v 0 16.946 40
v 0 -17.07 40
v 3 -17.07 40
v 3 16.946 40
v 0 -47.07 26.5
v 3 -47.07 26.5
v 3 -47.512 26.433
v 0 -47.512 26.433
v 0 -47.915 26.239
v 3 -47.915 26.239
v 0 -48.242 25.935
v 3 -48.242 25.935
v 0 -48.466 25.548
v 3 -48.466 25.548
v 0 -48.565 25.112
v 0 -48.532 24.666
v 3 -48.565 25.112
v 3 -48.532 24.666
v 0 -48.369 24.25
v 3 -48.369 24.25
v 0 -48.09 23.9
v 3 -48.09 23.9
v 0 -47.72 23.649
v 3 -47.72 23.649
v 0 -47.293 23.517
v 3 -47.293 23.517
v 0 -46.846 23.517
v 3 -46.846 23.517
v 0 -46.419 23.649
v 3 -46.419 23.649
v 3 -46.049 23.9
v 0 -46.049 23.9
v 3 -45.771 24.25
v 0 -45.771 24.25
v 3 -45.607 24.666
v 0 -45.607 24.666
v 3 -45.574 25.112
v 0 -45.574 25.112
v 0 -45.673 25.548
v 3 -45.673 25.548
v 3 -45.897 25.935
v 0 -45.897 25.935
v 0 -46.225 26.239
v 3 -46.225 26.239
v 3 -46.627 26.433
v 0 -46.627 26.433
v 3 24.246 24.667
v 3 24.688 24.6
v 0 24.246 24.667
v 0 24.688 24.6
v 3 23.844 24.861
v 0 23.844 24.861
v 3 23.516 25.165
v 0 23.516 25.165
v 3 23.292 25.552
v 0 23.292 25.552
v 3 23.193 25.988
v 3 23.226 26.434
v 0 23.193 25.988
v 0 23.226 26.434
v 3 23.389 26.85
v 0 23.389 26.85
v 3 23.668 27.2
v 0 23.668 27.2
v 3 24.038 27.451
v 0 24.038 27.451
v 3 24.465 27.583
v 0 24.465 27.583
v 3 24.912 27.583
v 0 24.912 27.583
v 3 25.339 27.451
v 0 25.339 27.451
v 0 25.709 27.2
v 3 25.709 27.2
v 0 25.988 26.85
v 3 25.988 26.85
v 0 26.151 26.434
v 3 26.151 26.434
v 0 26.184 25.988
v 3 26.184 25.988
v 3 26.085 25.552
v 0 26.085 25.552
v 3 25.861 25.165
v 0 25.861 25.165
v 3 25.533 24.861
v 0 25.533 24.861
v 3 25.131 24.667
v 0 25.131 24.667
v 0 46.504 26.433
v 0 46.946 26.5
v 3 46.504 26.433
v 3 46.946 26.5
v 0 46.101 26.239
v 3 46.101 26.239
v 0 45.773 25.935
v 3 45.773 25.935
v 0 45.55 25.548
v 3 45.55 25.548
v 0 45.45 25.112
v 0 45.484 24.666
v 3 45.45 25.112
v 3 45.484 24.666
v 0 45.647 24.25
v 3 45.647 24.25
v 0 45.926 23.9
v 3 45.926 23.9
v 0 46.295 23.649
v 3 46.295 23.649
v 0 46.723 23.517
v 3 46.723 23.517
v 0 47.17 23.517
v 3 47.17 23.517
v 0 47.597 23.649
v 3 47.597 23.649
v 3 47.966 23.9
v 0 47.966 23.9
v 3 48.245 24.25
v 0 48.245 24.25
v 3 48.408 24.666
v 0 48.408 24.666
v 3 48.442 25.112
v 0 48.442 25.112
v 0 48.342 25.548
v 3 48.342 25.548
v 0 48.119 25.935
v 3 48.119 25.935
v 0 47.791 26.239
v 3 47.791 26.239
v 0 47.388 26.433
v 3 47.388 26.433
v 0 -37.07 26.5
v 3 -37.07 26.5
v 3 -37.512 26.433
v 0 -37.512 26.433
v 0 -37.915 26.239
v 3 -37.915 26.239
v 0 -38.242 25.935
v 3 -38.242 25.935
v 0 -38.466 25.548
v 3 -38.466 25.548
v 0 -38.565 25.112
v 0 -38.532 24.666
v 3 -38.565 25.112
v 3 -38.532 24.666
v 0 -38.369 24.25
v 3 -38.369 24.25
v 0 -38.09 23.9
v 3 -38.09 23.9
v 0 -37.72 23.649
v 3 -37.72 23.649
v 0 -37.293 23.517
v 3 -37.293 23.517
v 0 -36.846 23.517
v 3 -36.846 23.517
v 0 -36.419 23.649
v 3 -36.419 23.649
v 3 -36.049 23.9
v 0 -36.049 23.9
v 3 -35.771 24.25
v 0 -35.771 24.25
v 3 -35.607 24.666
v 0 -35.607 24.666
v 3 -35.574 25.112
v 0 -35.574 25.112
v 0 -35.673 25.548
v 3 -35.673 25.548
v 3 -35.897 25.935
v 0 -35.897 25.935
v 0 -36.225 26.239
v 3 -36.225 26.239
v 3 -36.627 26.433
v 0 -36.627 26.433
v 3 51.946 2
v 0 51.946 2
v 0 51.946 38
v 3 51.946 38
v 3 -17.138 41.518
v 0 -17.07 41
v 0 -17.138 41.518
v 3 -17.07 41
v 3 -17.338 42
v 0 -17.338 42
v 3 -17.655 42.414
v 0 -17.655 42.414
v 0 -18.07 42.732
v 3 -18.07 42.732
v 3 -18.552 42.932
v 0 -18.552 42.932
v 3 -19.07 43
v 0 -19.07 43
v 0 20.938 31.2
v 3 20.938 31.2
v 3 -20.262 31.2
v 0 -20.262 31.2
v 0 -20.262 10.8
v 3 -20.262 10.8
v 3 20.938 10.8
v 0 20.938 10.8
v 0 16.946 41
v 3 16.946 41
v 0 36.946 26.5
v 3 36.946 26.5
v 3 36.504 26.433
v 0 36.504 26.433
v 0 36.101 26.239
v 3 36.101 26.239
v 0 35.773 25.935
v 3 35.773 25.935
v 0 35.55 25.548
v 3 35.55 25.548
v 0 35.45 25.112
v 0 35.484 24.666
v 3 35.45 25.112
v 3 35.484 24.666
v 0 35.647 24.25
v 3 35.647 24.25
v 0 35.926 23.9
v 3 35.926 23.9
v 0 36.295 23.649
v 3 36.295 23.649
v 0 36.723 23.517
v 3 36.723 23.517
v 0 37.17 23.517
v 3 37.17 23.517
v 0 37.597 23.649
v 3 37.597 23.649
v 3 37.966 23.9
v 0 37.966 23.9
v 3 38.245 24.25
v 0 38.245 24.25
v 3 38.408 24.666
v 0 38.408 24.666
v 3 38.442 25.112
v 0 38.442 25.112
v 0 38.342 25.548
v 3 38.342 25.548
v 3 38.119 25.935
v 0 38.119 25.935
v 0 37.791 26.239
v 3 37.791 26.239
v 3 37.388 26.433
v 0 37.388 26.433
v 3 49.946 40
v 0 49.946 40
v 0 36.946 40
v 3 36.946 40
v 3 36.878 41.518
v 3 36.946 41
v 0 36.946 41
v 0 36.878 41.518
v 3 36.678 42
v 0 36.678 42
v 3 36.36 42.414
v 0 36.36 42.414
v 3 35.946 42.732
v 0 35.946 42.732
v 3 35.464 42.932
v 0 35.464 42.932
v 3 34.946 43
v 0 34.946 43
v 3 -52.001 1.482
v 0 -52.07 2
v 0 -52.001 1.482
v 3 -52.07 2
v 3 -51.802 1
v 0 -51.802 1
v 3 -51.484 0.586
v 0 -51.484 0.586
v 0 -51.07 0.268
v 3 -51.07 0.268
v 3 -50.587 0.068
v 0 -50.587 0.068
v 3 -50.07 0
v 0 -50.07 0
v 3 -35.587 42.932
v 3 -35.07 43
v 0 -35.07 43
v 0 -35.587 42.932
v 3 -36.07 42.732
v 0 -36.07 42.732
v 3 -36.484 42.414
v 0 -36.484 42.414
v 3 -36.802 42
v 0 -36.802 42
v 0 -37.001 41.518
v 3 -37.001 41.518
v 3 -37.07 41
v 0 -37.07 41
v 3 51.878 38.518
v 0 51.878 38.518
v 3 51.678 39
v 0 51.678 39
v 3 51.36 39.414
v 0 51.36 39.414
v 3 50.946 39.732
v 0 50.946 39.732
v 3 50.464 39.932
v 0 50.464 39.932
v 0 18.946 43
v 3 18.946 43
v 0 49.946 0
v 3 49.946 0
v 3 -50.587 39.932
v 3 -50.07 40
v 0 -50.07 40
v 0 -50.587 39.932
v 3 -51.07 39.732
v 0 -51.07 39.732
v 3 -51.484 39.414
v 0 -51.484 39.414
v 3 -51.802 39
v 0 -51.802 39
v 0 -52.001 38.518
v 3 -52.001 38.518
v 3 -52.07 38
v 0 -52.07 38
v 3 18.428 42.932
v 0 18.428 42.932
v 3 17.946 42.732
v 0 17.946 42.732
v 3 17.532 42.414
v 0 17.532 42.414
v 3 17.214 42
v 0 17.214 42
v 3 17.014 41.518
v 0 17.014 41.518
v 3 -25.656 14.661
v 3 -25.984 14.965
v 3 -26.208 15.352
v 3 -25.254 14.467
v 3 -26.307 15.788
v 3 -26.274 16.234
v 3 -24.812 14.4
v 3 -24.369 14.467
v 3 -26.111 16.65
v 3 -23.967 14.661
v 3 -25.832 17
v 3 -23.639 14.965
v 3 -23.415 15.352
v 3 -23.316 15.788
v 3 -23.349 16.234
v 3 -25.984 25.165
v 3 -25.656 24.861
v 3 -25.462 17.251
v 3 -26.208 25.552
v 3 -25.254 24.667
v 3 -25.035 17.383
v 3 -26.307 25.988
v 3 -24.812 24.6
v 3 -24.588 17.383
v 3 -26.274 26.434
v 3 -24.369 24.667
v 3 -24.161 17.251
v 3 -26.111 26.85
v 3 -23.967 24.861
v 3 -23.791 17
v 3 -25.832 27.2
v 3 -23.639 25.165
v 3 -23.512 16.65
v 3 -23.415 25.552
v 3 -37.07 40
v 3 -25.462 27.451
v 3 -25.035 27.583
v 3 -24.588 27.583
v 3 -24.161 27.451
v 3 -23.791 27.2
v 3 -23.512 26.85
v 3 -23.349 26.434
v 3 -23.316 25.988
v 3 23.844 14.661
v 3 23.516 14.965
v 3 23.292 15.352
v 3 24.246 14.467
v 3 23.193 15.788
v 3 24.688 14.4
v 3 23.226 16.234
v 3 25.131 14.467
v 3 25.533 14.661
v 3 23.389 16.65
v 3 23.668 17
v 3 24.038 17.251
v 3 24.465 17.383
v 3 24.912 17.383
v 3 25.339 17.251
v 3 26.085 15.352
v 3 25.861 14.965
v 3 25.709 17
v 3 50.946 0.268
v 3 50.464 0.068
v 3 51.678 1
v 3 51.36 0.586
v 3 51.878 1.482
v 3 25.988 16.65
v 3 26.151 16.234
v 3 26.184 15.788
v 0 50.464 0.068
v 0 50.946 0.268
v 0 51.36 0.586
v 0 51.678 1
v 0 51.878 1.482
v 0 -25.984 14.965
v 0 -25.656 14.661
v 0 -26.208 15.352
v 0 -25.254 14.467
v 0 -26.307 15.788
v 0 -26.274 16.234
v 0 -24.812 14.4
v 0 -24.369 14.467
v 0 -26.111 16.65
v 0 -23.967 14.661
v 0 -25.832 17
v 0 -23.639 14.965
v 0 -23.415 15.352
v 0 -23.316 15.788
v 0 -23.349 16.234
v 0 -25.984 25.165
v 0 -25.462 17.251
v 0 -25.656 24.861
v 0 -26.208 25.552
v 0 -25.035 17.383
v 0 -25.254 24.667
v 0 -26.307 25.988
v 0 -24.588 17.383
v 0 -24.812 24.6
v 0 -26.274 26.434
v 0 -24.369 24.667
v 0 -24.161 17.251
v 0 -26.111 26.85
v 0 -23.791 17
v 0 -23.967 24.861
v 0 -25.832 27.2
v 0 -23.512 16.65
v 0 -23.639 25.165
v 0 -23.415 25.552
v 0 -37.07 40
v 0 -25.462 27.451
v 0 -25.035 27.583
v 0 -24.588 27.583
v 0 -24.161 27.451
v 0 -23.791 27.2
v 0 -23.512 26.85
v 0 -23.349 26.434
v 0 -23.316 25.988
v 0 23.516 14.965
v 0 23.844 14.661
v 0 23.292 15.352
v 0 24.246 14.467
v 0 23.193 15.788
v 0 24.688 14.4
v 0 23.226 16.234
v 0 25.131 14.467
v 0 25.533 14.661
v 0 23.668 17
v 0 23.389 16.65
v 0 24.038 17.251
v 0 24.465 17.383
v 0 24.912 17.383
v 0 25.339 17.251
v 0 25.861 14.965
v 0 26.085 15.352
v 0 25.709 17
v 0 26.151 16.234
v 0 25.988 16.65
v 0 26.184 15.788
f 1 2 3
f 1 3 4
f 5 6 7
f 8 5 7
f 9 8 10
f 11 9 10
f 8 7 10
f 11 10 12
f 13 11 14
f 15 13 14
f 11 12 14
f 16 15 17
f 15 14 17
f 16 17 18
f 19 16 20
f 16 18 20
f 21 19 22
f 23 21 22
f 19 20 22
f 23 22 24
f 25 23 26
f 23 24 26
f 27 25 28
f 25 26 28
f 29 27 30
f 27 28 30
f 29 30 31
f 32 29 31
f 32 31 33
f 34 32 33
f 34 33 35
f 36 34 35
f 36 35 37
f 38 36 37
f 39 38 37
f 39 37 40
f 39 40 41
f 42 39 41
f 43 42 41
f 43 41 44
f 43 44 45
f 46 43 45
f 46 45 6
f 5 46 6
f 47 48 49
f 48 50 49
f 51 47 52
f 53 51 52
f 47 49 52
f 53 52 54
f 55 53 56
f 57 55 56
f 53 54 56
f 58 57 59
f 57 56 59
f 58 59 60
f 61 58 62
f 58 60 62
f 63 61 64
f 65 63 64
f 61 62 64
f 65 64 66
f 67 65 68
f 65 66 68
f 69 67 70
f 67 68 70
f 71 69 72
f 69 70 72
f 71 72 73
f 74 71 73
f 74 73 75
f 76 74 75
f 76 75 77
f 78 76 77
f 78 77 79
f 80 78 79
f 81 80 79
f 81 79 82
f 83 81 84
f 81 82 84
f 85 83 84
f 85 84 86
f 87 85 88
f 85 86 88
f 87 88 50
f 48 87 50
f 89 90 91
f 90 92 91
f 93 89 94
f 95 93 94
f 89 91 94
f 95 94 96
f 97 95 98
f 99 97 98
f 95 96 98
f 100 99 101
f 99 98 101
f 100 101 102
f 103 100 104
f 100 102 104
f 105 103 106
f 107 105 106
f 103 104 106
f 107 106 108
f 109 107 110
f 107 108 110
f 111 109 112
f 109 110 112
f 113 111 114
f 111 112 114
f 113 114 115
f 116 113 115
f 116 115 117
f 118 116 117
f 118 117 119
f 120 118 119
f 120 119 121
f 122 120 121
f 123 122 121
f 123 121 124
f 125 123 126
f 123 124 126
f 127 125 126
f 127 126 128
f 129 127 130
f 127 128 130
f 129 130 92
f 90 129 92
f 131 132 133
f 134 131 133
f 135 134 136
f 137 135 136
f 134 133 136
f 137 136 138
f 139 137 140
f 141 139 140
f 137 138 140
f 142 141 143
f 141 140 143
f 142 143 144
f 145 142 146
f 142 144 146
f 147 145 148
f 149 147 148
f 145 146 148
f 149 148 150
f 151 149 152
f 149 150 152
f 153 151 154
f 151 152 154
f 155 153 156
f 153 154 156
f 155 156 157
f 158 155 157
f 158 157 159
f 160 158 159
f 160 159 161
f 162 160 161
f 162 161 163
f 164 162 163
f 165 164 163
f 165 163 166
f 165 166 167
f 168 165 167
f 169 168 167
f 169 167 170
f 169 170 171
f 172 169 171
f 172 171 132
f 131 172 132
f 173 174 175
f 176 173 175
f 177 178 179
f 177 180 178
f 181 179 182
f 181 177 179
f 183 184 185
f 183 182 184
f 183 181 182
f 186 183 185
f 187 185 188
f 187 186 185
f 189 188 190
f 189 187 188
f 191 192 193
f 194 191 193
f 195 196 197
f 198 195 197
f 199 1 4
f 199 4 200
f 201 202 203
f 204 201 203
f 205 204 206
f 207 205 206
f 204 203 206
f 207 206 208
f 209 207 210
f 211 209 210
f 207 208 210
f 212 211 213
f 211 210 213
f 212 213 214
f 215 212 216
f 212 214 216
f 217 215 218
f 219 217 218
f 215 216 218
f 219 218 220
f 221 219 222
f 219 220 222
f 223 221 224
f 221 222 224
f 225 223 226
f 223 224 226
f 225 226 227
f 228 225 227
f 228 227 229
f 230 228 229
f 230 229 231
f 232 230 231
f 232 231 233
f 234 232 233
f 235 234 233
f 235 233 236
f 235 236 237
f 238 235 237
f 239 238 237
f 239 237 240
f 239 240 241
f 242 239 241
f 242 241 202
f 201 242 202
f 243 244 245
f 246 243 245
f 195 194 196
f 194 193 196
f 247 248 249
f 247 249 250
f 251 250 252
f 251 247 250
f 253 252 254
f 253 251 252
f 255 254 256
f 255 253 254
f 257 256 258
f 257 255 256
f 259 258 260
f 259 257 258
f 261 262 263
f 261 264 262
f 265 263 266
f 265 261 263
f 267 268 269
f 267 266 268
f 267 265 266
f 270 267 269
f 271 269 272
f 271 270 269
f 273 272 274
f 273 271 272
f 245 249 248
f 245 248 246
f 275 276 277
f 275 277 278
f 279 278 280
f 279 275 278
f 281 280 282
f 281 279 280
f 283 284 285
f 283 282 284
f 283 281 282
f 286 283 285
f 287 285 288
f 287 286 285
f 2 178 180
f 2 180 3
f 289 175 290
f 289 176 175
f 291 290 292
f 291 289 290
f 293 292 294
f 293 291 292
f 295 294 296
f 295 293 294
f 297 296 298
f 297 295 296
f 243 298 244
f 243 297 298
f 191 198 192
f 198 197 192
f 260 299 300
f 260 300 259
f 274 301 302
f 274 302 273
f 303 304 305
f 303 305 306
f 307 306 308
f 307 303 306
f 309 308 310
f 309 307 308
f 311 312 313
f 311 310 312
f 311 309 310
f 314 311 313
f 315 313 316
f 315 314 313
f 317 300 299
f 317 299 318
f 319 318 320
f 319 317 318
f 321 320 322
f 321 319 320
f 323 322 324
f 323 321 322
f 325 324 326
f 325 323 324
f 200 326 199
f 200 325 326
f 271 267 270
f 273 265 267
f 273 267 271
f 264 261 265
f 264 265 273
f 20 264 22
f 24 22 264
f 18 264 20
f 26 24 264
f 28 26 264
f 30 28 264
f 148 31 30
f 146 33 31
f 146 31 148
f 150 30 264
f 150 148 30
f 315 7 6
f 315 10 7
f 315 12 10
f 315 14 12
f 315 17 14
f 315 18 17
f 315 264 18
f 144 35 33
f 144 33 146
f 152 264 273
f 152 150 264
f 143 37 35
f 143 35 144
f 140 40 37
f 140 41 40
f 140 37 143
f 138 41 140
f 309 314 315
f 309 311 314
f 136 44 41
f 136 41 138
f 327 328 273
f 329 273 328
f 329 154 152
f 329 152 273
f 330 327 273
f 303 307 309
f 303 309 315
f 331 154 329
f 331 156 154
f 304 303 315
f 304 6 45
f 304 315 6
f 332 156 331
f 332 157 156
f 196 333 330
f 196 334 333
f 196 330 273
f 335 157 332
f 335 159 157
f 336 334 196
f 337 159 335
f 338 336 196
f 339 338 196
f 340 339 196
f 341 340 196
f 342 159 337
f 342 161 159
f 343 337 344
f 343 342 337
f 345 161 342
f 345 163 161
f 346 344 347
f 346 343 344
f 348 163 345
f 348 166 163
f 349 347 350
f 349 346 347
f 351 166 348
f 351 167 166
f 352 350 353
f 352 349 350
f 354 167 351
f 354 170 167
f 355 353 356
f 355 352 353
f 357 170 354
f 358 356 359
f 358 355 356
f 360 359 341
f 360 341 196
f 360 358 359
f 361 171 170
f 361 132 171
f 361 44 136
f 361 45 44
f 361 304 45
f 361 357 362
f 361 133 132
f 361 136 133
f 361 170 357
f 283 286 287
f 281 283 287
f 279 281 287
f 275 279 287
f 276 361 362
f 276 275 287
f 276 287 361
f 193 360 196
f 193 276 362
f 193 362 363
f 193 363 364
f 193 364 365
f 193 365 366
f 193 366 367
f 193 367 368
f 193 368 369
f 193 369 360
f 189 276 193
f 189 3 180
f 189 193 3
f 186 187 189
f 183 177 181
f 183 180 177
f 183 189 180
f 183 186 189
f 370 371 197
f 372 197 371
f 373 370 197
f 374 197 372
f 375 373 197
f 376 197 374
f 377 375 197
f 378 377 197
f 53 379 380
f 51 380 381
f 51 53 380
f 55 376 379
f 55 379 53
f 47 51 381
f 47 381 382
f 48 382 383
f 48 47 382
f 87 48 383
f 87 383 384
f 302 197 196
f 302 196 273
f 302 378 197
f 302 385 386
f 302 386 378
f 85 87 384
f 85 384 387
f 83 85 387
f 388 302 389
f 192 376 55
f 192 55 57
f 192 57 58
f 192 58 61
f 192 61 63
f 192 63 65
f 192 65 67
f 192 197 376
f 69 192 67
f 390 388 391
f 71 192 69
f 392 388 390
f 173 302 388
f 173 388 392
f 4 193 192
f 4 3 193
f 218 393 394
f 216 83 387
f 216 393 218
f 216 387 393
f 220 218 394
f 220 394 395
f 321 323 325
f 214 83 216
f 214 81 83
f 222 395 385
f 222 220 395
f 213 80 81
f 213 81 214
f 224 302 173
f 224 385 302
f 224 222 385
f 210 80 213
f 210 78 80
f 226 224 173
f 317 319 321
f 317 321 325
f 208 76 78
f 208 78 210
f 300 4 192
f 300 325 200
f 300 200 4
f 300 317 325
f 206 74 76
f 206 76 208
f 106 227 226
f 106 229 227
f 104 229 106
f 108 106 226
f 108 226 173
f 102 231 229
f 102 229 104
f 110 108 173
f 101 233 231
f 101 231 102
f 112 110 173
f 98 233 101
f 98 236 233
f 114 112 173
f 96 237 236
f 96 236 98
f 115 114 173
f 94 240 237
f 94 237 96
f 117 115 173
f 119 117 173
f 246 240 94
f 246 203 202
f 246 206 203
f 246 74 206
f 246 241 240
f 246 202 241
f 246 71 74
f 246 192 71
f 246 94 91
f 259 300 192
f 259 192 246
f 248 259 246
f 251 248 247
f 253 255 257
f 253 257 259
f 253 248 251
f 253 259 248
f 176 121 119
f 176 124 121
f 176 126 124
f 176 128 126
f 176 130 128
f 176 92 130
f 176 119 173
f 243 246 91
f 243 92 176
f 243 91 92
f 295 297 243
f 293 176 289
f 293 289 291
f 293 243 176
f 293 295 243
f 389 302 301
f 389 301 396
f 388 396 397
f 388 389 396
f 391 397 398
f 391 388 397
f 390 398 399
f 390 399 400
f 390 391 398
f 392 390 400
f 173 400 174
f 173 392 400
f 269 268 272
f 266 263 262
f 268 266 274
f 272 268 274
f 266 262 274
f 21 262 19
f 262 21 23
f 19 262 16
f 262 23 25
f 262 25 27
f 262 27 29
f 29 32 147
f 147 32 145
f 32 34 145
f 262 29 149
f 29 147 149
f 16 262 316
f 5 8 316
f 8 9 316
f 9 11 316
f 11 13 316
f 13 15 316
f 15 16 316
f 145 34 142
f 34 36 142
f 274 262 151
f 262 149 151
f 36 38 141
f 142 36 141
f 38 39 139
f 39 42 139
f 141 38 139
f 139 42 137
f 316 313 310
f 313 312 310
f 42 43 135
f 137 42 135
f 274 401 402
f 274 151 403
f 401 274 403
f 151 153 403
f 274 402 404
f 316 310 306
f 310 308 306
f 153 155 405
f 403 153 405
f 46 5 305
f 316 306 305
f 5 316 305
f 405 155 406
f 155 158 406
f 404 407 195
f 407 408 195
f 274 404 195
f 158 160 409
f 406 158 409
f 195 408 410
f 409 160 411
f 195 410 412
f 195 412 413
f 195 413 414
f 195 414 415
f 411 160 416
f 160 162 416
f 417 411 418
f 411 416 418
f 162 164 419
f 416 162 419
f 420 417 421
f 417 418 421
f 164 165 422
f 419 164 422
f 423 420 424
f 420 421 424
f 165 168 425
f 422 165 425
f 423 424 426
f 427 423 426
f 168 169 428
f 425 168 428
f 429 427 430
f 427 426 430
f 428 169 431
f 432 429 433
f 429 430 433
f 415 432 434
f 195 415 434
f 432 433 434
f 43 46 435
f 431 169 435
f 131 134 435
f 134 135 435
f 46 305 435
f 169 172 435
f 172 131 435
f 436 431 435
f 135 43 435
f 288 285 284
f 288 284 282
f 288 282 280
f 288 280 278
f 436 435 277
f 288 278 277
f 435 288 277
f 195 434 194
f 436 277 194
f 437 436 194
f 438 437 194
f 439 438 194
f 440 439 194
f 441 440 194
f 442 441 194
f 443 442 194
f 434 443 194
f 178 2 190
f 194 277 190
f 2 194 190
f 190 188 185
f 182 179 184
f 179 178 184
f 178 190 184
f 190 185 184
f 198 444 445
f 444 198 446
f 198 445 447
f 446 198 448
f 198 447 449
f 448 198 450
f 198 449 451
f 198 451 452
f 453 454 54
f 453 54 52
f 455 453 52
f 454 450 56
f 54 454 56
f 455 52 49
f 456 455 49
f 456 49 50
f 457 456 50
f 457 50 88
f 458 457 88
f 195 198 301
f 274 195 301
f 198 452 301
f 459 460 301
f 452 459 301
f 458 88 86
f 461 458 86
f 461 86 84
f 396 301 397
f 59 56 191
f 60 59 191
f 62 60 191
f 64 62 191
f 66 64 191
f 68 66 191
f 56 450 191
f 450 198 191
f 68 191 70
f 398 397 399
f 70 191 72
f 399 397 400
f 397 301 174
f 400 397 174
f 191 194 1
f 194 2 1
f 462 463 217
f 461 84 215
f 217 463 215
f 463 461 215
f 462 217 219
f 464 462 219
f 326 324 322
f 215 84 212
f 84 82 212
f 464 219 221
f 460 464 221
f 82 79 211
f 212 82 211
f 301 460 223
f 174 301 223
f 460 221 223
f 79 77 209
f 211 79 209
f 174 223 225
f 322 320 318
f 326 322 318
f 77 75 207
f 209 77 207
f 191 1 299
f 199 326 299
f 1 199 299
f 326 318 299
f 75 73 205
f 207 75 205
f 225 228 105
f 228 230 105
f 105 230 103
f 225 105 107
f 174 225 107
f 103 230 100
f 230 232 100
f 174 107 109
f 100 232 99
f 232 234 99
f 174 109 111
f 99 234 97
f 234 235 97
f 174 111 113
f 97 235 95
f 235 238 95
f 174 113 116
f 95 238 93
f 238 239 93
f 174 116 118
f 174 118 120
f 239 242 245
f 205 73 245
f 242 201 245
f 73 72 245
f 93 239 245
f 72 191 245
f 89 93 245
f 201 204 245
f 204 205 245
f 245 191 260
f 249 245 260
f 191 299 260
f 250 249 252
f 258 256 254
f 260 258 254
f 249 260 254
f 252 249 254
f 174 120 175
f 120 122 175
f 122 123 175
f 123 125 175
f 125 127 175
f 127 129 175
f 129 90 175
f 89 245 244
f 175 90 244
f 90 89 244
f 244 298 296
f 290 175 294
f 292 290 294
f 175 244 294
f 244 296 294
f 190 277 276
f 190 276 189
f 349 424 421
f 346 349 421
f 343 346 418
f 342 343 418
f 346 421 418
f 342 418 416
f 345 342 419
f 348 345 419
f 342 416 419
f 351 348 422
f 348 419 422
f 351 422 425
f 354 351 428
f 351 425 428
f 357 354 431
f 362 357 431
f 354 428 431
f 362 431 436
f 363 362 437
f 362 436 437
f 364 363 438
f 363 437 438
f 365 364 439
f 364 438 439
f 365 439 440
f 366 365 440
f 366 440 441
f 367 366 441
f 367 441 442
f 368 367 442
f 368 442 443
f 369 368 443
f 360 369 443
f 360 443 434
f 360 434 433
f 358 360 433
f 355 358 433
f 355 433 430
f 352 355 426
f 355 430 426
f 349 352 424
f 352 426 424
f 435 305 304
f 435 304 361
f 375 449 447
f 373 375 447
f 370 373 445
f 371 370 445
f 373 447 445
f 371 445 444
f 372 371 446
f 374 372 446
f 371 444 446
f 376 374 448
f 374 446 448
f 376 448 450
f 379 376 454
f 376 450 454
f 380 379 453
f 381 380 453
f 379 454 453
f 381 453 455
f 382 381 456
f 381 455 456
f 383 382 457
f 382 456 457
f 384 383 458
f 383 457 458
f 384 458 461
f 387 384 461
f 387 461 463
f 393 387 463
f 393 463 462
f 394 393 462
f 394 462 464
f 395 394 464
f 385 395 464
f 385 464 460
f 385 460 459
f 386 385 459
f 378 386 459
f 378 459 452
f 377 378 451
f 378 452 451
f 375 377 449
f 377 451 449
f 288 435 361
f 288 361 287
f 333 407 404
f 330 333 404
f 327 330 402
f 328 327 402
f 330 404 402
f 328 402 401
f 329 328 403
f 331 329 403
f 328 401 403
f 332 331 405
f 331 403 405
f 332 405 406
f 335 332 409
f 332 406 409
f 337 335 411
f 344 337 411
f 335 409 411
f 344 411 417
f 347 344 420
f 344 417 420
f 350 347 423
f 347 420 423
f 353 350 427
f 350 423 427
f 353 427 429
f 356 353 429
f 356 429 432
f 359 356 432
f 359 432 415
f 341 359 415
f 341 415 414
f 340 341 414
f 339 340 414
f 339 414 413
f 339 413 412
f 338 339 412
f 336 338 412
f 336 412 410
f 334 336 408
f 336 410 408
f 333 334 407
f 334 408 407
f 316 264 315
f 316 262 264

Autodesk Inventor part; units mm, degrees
ref_plane "YZ Plane" through (0, 0, 0) normal (1, 0, 0) x (0, 1, 0)
ref_plane "XZ Plane" through (0, 0, 0) normal (0, 1, 0) x (-1, 0, 0)
ref_plane "XY Plane" through (0, 0, 0) normal (0, 0, 1) x (1, 0, 0)
sketch "Boceto1" plane through (0, 0, 0) normal (1, 0, 0) x (0, 1, 0)
  line L0 (0, 0) -> (-52.0696, 0)
  line L1 (-52.0696, 0) -> (-52.0696, 40)
  line L2 (-52.0696, 40) -> (0, 40)
  line L3 (0, 40) -> (0, 0)
  line L4 (0, 0) -> (51.9461, 0)
  line L5 (51.9461, 0) -> (51.9461, 40)
  line L6 (51.9461, 40) -> (0, 40)
  line L7 (0, 40) -> (0, 0)
  line L8 (-52.0696, 43) -> (-52.0696, 40) construction
  line L9 (51.9461, 43) -> (51.9461, 40) construction
  line L10 (36.9461, 40) -> (16.9461, 40)
  line L11 (16.9461, 40) -> (16.9461, 43)
  line L12 (16.9461, 43) -> (36.9461, 43)
  line L13 (36.9461, 43) -> (36.9461, 40)
  line L14 (-17.0696, 40) -> (-37.0696, 40)
  line L15 (-37.0696, 40) -> (-37.0696, 43)
  line L16 (-37.0696, 43) -> (-17.0696, 43)
  line L17 (-17.0696, 43) -> (-17.0696, 40)
  point P0 (16.9461, 40)
  dimension "d15" = 40
  dimension "d16" = 20
  dimension "d17" = 3
  dimension "d18" = 15
  dimension "d19" = 3
  dimension "d20" = 20
  dimension "d21" = 15
extrude "Extrusión1" add sketch "Boceto1" along normal blind 3
sketch "Boceto4" plane through (0, 0, 0) normal (-1, 0, 0) x (0, 0, 1)
  circle A0 centre (25, -37.0696) radius 1.6 construction
  circle A1 centre (25, -47.0696) radius 1.6 construction
  circle A2 centre (25, 36.9461) radius 1.6 construction
  circle A3 centre (25, 46.9461) radius 1.6 construction
  point P0 (0, 0)
hole "Agujero2" at (0, -47.0696, 25) at (0, -37.0696, 25) at (0, 36.9461, 25) at (0, 46.9461, 25) direction (1, 0, 0) diameter 3 end through all
sketch "Boceto5" plane through (3, 0, 0) normal (1, 0, 0) x (0, 0, -1)
  circle A0 centre (-23, 9.9416) radius 1.45 construction
  point P0 (0, 0)
hole "Agujero3" [suppressed]
sketch "ReferenciaEje" plane through (3, 0, 0) normal (1, 0, 0) x (0, 0, -1)
  circle A0 centre (-23, 9.9385) radius 1.65 construction
  line L0 (-40, 16.9461) -> (-40, -17.0696) construction
  line L1 (0, 51.9461) -> (-40, 51.9461) construction
  circle A1 centre (-21, 9.9385) radius 0.5
  point P0 (0, 0)
  dimension "d59" = 19
  dimension "d60" = 42.0076
  dimension "d61" = 1
sketch "Boceto9" plane through (3, 0, 0) normal (1, 0, 0) x (0, 0, -1)
  circle A0 centre (-15.9, 24.6885) radius 2.25 construction
  circle A1 centre (-26.1, 24.6885) radius 2.25 construction
  circle A2 centre (-15.9, -24.8115) radius 2.25 construction
  circle A3 centre (-26.1, -24.8115) radius 2.25 construction
  point P0 (0, 0)
hole "Agujero4" at (3, 24.6885, 15.9) at (3, 24.6885, 26.1) at (3, -24.8115, 26.1) at (3, -24.8115, 15.9) direction (-1, 0, 0) diameter 3 end through all
sketch "Boceto10" plane through (3, 0, 0) normal (1, 0, 0) x (0, 0, -1)
  line L0 (-11, 19.4385) -> (-11, -19.5615) construction
  line L1 (-30.5, 19.9385) -> (-11.5, 19.9385) construction
  line L2 (-31, -19.6129) -> (-31, 19.4898) construction
  line L3 (-11.4533, -20.0615) -> (-30.5467, -20.0615) construction
  line L4 (-10.8, 20.9385) -> (-31.2, 20.9385)
  line L5 (-31.2, 20.9385) -> (-31.2, -20.2615)
  line L6 (-31.2, -20.2615) -> (-10.8, -20.2615)
  line L7 (-10.8, -20.2615) -> (-10.8, 20.9385)
  point P0 (0, 0)
  point P1 (-11, -0.0615)
  dimension "d53" = 0.2
  dimension "d54" = 0.2
  dimension "d55" = 0.2
  dimension "d56" = 1
extrude "Extrusión4" cut sketch "Boceto10" against normal through all
fillet "Empalme1" radius 2 8 edges at (1.5, 51.9461, 0) (1.5, -52.0696, 0) (1.5, -52.0696, 40) (1.5, -37.0696, 43) (1.5, -17.0696, 43) (1.5, 16.9461, 43) (1.5, 36.9461, 43) (1.5, 51.9461, 40)
properties part number "ParedEnsambleMotor"
